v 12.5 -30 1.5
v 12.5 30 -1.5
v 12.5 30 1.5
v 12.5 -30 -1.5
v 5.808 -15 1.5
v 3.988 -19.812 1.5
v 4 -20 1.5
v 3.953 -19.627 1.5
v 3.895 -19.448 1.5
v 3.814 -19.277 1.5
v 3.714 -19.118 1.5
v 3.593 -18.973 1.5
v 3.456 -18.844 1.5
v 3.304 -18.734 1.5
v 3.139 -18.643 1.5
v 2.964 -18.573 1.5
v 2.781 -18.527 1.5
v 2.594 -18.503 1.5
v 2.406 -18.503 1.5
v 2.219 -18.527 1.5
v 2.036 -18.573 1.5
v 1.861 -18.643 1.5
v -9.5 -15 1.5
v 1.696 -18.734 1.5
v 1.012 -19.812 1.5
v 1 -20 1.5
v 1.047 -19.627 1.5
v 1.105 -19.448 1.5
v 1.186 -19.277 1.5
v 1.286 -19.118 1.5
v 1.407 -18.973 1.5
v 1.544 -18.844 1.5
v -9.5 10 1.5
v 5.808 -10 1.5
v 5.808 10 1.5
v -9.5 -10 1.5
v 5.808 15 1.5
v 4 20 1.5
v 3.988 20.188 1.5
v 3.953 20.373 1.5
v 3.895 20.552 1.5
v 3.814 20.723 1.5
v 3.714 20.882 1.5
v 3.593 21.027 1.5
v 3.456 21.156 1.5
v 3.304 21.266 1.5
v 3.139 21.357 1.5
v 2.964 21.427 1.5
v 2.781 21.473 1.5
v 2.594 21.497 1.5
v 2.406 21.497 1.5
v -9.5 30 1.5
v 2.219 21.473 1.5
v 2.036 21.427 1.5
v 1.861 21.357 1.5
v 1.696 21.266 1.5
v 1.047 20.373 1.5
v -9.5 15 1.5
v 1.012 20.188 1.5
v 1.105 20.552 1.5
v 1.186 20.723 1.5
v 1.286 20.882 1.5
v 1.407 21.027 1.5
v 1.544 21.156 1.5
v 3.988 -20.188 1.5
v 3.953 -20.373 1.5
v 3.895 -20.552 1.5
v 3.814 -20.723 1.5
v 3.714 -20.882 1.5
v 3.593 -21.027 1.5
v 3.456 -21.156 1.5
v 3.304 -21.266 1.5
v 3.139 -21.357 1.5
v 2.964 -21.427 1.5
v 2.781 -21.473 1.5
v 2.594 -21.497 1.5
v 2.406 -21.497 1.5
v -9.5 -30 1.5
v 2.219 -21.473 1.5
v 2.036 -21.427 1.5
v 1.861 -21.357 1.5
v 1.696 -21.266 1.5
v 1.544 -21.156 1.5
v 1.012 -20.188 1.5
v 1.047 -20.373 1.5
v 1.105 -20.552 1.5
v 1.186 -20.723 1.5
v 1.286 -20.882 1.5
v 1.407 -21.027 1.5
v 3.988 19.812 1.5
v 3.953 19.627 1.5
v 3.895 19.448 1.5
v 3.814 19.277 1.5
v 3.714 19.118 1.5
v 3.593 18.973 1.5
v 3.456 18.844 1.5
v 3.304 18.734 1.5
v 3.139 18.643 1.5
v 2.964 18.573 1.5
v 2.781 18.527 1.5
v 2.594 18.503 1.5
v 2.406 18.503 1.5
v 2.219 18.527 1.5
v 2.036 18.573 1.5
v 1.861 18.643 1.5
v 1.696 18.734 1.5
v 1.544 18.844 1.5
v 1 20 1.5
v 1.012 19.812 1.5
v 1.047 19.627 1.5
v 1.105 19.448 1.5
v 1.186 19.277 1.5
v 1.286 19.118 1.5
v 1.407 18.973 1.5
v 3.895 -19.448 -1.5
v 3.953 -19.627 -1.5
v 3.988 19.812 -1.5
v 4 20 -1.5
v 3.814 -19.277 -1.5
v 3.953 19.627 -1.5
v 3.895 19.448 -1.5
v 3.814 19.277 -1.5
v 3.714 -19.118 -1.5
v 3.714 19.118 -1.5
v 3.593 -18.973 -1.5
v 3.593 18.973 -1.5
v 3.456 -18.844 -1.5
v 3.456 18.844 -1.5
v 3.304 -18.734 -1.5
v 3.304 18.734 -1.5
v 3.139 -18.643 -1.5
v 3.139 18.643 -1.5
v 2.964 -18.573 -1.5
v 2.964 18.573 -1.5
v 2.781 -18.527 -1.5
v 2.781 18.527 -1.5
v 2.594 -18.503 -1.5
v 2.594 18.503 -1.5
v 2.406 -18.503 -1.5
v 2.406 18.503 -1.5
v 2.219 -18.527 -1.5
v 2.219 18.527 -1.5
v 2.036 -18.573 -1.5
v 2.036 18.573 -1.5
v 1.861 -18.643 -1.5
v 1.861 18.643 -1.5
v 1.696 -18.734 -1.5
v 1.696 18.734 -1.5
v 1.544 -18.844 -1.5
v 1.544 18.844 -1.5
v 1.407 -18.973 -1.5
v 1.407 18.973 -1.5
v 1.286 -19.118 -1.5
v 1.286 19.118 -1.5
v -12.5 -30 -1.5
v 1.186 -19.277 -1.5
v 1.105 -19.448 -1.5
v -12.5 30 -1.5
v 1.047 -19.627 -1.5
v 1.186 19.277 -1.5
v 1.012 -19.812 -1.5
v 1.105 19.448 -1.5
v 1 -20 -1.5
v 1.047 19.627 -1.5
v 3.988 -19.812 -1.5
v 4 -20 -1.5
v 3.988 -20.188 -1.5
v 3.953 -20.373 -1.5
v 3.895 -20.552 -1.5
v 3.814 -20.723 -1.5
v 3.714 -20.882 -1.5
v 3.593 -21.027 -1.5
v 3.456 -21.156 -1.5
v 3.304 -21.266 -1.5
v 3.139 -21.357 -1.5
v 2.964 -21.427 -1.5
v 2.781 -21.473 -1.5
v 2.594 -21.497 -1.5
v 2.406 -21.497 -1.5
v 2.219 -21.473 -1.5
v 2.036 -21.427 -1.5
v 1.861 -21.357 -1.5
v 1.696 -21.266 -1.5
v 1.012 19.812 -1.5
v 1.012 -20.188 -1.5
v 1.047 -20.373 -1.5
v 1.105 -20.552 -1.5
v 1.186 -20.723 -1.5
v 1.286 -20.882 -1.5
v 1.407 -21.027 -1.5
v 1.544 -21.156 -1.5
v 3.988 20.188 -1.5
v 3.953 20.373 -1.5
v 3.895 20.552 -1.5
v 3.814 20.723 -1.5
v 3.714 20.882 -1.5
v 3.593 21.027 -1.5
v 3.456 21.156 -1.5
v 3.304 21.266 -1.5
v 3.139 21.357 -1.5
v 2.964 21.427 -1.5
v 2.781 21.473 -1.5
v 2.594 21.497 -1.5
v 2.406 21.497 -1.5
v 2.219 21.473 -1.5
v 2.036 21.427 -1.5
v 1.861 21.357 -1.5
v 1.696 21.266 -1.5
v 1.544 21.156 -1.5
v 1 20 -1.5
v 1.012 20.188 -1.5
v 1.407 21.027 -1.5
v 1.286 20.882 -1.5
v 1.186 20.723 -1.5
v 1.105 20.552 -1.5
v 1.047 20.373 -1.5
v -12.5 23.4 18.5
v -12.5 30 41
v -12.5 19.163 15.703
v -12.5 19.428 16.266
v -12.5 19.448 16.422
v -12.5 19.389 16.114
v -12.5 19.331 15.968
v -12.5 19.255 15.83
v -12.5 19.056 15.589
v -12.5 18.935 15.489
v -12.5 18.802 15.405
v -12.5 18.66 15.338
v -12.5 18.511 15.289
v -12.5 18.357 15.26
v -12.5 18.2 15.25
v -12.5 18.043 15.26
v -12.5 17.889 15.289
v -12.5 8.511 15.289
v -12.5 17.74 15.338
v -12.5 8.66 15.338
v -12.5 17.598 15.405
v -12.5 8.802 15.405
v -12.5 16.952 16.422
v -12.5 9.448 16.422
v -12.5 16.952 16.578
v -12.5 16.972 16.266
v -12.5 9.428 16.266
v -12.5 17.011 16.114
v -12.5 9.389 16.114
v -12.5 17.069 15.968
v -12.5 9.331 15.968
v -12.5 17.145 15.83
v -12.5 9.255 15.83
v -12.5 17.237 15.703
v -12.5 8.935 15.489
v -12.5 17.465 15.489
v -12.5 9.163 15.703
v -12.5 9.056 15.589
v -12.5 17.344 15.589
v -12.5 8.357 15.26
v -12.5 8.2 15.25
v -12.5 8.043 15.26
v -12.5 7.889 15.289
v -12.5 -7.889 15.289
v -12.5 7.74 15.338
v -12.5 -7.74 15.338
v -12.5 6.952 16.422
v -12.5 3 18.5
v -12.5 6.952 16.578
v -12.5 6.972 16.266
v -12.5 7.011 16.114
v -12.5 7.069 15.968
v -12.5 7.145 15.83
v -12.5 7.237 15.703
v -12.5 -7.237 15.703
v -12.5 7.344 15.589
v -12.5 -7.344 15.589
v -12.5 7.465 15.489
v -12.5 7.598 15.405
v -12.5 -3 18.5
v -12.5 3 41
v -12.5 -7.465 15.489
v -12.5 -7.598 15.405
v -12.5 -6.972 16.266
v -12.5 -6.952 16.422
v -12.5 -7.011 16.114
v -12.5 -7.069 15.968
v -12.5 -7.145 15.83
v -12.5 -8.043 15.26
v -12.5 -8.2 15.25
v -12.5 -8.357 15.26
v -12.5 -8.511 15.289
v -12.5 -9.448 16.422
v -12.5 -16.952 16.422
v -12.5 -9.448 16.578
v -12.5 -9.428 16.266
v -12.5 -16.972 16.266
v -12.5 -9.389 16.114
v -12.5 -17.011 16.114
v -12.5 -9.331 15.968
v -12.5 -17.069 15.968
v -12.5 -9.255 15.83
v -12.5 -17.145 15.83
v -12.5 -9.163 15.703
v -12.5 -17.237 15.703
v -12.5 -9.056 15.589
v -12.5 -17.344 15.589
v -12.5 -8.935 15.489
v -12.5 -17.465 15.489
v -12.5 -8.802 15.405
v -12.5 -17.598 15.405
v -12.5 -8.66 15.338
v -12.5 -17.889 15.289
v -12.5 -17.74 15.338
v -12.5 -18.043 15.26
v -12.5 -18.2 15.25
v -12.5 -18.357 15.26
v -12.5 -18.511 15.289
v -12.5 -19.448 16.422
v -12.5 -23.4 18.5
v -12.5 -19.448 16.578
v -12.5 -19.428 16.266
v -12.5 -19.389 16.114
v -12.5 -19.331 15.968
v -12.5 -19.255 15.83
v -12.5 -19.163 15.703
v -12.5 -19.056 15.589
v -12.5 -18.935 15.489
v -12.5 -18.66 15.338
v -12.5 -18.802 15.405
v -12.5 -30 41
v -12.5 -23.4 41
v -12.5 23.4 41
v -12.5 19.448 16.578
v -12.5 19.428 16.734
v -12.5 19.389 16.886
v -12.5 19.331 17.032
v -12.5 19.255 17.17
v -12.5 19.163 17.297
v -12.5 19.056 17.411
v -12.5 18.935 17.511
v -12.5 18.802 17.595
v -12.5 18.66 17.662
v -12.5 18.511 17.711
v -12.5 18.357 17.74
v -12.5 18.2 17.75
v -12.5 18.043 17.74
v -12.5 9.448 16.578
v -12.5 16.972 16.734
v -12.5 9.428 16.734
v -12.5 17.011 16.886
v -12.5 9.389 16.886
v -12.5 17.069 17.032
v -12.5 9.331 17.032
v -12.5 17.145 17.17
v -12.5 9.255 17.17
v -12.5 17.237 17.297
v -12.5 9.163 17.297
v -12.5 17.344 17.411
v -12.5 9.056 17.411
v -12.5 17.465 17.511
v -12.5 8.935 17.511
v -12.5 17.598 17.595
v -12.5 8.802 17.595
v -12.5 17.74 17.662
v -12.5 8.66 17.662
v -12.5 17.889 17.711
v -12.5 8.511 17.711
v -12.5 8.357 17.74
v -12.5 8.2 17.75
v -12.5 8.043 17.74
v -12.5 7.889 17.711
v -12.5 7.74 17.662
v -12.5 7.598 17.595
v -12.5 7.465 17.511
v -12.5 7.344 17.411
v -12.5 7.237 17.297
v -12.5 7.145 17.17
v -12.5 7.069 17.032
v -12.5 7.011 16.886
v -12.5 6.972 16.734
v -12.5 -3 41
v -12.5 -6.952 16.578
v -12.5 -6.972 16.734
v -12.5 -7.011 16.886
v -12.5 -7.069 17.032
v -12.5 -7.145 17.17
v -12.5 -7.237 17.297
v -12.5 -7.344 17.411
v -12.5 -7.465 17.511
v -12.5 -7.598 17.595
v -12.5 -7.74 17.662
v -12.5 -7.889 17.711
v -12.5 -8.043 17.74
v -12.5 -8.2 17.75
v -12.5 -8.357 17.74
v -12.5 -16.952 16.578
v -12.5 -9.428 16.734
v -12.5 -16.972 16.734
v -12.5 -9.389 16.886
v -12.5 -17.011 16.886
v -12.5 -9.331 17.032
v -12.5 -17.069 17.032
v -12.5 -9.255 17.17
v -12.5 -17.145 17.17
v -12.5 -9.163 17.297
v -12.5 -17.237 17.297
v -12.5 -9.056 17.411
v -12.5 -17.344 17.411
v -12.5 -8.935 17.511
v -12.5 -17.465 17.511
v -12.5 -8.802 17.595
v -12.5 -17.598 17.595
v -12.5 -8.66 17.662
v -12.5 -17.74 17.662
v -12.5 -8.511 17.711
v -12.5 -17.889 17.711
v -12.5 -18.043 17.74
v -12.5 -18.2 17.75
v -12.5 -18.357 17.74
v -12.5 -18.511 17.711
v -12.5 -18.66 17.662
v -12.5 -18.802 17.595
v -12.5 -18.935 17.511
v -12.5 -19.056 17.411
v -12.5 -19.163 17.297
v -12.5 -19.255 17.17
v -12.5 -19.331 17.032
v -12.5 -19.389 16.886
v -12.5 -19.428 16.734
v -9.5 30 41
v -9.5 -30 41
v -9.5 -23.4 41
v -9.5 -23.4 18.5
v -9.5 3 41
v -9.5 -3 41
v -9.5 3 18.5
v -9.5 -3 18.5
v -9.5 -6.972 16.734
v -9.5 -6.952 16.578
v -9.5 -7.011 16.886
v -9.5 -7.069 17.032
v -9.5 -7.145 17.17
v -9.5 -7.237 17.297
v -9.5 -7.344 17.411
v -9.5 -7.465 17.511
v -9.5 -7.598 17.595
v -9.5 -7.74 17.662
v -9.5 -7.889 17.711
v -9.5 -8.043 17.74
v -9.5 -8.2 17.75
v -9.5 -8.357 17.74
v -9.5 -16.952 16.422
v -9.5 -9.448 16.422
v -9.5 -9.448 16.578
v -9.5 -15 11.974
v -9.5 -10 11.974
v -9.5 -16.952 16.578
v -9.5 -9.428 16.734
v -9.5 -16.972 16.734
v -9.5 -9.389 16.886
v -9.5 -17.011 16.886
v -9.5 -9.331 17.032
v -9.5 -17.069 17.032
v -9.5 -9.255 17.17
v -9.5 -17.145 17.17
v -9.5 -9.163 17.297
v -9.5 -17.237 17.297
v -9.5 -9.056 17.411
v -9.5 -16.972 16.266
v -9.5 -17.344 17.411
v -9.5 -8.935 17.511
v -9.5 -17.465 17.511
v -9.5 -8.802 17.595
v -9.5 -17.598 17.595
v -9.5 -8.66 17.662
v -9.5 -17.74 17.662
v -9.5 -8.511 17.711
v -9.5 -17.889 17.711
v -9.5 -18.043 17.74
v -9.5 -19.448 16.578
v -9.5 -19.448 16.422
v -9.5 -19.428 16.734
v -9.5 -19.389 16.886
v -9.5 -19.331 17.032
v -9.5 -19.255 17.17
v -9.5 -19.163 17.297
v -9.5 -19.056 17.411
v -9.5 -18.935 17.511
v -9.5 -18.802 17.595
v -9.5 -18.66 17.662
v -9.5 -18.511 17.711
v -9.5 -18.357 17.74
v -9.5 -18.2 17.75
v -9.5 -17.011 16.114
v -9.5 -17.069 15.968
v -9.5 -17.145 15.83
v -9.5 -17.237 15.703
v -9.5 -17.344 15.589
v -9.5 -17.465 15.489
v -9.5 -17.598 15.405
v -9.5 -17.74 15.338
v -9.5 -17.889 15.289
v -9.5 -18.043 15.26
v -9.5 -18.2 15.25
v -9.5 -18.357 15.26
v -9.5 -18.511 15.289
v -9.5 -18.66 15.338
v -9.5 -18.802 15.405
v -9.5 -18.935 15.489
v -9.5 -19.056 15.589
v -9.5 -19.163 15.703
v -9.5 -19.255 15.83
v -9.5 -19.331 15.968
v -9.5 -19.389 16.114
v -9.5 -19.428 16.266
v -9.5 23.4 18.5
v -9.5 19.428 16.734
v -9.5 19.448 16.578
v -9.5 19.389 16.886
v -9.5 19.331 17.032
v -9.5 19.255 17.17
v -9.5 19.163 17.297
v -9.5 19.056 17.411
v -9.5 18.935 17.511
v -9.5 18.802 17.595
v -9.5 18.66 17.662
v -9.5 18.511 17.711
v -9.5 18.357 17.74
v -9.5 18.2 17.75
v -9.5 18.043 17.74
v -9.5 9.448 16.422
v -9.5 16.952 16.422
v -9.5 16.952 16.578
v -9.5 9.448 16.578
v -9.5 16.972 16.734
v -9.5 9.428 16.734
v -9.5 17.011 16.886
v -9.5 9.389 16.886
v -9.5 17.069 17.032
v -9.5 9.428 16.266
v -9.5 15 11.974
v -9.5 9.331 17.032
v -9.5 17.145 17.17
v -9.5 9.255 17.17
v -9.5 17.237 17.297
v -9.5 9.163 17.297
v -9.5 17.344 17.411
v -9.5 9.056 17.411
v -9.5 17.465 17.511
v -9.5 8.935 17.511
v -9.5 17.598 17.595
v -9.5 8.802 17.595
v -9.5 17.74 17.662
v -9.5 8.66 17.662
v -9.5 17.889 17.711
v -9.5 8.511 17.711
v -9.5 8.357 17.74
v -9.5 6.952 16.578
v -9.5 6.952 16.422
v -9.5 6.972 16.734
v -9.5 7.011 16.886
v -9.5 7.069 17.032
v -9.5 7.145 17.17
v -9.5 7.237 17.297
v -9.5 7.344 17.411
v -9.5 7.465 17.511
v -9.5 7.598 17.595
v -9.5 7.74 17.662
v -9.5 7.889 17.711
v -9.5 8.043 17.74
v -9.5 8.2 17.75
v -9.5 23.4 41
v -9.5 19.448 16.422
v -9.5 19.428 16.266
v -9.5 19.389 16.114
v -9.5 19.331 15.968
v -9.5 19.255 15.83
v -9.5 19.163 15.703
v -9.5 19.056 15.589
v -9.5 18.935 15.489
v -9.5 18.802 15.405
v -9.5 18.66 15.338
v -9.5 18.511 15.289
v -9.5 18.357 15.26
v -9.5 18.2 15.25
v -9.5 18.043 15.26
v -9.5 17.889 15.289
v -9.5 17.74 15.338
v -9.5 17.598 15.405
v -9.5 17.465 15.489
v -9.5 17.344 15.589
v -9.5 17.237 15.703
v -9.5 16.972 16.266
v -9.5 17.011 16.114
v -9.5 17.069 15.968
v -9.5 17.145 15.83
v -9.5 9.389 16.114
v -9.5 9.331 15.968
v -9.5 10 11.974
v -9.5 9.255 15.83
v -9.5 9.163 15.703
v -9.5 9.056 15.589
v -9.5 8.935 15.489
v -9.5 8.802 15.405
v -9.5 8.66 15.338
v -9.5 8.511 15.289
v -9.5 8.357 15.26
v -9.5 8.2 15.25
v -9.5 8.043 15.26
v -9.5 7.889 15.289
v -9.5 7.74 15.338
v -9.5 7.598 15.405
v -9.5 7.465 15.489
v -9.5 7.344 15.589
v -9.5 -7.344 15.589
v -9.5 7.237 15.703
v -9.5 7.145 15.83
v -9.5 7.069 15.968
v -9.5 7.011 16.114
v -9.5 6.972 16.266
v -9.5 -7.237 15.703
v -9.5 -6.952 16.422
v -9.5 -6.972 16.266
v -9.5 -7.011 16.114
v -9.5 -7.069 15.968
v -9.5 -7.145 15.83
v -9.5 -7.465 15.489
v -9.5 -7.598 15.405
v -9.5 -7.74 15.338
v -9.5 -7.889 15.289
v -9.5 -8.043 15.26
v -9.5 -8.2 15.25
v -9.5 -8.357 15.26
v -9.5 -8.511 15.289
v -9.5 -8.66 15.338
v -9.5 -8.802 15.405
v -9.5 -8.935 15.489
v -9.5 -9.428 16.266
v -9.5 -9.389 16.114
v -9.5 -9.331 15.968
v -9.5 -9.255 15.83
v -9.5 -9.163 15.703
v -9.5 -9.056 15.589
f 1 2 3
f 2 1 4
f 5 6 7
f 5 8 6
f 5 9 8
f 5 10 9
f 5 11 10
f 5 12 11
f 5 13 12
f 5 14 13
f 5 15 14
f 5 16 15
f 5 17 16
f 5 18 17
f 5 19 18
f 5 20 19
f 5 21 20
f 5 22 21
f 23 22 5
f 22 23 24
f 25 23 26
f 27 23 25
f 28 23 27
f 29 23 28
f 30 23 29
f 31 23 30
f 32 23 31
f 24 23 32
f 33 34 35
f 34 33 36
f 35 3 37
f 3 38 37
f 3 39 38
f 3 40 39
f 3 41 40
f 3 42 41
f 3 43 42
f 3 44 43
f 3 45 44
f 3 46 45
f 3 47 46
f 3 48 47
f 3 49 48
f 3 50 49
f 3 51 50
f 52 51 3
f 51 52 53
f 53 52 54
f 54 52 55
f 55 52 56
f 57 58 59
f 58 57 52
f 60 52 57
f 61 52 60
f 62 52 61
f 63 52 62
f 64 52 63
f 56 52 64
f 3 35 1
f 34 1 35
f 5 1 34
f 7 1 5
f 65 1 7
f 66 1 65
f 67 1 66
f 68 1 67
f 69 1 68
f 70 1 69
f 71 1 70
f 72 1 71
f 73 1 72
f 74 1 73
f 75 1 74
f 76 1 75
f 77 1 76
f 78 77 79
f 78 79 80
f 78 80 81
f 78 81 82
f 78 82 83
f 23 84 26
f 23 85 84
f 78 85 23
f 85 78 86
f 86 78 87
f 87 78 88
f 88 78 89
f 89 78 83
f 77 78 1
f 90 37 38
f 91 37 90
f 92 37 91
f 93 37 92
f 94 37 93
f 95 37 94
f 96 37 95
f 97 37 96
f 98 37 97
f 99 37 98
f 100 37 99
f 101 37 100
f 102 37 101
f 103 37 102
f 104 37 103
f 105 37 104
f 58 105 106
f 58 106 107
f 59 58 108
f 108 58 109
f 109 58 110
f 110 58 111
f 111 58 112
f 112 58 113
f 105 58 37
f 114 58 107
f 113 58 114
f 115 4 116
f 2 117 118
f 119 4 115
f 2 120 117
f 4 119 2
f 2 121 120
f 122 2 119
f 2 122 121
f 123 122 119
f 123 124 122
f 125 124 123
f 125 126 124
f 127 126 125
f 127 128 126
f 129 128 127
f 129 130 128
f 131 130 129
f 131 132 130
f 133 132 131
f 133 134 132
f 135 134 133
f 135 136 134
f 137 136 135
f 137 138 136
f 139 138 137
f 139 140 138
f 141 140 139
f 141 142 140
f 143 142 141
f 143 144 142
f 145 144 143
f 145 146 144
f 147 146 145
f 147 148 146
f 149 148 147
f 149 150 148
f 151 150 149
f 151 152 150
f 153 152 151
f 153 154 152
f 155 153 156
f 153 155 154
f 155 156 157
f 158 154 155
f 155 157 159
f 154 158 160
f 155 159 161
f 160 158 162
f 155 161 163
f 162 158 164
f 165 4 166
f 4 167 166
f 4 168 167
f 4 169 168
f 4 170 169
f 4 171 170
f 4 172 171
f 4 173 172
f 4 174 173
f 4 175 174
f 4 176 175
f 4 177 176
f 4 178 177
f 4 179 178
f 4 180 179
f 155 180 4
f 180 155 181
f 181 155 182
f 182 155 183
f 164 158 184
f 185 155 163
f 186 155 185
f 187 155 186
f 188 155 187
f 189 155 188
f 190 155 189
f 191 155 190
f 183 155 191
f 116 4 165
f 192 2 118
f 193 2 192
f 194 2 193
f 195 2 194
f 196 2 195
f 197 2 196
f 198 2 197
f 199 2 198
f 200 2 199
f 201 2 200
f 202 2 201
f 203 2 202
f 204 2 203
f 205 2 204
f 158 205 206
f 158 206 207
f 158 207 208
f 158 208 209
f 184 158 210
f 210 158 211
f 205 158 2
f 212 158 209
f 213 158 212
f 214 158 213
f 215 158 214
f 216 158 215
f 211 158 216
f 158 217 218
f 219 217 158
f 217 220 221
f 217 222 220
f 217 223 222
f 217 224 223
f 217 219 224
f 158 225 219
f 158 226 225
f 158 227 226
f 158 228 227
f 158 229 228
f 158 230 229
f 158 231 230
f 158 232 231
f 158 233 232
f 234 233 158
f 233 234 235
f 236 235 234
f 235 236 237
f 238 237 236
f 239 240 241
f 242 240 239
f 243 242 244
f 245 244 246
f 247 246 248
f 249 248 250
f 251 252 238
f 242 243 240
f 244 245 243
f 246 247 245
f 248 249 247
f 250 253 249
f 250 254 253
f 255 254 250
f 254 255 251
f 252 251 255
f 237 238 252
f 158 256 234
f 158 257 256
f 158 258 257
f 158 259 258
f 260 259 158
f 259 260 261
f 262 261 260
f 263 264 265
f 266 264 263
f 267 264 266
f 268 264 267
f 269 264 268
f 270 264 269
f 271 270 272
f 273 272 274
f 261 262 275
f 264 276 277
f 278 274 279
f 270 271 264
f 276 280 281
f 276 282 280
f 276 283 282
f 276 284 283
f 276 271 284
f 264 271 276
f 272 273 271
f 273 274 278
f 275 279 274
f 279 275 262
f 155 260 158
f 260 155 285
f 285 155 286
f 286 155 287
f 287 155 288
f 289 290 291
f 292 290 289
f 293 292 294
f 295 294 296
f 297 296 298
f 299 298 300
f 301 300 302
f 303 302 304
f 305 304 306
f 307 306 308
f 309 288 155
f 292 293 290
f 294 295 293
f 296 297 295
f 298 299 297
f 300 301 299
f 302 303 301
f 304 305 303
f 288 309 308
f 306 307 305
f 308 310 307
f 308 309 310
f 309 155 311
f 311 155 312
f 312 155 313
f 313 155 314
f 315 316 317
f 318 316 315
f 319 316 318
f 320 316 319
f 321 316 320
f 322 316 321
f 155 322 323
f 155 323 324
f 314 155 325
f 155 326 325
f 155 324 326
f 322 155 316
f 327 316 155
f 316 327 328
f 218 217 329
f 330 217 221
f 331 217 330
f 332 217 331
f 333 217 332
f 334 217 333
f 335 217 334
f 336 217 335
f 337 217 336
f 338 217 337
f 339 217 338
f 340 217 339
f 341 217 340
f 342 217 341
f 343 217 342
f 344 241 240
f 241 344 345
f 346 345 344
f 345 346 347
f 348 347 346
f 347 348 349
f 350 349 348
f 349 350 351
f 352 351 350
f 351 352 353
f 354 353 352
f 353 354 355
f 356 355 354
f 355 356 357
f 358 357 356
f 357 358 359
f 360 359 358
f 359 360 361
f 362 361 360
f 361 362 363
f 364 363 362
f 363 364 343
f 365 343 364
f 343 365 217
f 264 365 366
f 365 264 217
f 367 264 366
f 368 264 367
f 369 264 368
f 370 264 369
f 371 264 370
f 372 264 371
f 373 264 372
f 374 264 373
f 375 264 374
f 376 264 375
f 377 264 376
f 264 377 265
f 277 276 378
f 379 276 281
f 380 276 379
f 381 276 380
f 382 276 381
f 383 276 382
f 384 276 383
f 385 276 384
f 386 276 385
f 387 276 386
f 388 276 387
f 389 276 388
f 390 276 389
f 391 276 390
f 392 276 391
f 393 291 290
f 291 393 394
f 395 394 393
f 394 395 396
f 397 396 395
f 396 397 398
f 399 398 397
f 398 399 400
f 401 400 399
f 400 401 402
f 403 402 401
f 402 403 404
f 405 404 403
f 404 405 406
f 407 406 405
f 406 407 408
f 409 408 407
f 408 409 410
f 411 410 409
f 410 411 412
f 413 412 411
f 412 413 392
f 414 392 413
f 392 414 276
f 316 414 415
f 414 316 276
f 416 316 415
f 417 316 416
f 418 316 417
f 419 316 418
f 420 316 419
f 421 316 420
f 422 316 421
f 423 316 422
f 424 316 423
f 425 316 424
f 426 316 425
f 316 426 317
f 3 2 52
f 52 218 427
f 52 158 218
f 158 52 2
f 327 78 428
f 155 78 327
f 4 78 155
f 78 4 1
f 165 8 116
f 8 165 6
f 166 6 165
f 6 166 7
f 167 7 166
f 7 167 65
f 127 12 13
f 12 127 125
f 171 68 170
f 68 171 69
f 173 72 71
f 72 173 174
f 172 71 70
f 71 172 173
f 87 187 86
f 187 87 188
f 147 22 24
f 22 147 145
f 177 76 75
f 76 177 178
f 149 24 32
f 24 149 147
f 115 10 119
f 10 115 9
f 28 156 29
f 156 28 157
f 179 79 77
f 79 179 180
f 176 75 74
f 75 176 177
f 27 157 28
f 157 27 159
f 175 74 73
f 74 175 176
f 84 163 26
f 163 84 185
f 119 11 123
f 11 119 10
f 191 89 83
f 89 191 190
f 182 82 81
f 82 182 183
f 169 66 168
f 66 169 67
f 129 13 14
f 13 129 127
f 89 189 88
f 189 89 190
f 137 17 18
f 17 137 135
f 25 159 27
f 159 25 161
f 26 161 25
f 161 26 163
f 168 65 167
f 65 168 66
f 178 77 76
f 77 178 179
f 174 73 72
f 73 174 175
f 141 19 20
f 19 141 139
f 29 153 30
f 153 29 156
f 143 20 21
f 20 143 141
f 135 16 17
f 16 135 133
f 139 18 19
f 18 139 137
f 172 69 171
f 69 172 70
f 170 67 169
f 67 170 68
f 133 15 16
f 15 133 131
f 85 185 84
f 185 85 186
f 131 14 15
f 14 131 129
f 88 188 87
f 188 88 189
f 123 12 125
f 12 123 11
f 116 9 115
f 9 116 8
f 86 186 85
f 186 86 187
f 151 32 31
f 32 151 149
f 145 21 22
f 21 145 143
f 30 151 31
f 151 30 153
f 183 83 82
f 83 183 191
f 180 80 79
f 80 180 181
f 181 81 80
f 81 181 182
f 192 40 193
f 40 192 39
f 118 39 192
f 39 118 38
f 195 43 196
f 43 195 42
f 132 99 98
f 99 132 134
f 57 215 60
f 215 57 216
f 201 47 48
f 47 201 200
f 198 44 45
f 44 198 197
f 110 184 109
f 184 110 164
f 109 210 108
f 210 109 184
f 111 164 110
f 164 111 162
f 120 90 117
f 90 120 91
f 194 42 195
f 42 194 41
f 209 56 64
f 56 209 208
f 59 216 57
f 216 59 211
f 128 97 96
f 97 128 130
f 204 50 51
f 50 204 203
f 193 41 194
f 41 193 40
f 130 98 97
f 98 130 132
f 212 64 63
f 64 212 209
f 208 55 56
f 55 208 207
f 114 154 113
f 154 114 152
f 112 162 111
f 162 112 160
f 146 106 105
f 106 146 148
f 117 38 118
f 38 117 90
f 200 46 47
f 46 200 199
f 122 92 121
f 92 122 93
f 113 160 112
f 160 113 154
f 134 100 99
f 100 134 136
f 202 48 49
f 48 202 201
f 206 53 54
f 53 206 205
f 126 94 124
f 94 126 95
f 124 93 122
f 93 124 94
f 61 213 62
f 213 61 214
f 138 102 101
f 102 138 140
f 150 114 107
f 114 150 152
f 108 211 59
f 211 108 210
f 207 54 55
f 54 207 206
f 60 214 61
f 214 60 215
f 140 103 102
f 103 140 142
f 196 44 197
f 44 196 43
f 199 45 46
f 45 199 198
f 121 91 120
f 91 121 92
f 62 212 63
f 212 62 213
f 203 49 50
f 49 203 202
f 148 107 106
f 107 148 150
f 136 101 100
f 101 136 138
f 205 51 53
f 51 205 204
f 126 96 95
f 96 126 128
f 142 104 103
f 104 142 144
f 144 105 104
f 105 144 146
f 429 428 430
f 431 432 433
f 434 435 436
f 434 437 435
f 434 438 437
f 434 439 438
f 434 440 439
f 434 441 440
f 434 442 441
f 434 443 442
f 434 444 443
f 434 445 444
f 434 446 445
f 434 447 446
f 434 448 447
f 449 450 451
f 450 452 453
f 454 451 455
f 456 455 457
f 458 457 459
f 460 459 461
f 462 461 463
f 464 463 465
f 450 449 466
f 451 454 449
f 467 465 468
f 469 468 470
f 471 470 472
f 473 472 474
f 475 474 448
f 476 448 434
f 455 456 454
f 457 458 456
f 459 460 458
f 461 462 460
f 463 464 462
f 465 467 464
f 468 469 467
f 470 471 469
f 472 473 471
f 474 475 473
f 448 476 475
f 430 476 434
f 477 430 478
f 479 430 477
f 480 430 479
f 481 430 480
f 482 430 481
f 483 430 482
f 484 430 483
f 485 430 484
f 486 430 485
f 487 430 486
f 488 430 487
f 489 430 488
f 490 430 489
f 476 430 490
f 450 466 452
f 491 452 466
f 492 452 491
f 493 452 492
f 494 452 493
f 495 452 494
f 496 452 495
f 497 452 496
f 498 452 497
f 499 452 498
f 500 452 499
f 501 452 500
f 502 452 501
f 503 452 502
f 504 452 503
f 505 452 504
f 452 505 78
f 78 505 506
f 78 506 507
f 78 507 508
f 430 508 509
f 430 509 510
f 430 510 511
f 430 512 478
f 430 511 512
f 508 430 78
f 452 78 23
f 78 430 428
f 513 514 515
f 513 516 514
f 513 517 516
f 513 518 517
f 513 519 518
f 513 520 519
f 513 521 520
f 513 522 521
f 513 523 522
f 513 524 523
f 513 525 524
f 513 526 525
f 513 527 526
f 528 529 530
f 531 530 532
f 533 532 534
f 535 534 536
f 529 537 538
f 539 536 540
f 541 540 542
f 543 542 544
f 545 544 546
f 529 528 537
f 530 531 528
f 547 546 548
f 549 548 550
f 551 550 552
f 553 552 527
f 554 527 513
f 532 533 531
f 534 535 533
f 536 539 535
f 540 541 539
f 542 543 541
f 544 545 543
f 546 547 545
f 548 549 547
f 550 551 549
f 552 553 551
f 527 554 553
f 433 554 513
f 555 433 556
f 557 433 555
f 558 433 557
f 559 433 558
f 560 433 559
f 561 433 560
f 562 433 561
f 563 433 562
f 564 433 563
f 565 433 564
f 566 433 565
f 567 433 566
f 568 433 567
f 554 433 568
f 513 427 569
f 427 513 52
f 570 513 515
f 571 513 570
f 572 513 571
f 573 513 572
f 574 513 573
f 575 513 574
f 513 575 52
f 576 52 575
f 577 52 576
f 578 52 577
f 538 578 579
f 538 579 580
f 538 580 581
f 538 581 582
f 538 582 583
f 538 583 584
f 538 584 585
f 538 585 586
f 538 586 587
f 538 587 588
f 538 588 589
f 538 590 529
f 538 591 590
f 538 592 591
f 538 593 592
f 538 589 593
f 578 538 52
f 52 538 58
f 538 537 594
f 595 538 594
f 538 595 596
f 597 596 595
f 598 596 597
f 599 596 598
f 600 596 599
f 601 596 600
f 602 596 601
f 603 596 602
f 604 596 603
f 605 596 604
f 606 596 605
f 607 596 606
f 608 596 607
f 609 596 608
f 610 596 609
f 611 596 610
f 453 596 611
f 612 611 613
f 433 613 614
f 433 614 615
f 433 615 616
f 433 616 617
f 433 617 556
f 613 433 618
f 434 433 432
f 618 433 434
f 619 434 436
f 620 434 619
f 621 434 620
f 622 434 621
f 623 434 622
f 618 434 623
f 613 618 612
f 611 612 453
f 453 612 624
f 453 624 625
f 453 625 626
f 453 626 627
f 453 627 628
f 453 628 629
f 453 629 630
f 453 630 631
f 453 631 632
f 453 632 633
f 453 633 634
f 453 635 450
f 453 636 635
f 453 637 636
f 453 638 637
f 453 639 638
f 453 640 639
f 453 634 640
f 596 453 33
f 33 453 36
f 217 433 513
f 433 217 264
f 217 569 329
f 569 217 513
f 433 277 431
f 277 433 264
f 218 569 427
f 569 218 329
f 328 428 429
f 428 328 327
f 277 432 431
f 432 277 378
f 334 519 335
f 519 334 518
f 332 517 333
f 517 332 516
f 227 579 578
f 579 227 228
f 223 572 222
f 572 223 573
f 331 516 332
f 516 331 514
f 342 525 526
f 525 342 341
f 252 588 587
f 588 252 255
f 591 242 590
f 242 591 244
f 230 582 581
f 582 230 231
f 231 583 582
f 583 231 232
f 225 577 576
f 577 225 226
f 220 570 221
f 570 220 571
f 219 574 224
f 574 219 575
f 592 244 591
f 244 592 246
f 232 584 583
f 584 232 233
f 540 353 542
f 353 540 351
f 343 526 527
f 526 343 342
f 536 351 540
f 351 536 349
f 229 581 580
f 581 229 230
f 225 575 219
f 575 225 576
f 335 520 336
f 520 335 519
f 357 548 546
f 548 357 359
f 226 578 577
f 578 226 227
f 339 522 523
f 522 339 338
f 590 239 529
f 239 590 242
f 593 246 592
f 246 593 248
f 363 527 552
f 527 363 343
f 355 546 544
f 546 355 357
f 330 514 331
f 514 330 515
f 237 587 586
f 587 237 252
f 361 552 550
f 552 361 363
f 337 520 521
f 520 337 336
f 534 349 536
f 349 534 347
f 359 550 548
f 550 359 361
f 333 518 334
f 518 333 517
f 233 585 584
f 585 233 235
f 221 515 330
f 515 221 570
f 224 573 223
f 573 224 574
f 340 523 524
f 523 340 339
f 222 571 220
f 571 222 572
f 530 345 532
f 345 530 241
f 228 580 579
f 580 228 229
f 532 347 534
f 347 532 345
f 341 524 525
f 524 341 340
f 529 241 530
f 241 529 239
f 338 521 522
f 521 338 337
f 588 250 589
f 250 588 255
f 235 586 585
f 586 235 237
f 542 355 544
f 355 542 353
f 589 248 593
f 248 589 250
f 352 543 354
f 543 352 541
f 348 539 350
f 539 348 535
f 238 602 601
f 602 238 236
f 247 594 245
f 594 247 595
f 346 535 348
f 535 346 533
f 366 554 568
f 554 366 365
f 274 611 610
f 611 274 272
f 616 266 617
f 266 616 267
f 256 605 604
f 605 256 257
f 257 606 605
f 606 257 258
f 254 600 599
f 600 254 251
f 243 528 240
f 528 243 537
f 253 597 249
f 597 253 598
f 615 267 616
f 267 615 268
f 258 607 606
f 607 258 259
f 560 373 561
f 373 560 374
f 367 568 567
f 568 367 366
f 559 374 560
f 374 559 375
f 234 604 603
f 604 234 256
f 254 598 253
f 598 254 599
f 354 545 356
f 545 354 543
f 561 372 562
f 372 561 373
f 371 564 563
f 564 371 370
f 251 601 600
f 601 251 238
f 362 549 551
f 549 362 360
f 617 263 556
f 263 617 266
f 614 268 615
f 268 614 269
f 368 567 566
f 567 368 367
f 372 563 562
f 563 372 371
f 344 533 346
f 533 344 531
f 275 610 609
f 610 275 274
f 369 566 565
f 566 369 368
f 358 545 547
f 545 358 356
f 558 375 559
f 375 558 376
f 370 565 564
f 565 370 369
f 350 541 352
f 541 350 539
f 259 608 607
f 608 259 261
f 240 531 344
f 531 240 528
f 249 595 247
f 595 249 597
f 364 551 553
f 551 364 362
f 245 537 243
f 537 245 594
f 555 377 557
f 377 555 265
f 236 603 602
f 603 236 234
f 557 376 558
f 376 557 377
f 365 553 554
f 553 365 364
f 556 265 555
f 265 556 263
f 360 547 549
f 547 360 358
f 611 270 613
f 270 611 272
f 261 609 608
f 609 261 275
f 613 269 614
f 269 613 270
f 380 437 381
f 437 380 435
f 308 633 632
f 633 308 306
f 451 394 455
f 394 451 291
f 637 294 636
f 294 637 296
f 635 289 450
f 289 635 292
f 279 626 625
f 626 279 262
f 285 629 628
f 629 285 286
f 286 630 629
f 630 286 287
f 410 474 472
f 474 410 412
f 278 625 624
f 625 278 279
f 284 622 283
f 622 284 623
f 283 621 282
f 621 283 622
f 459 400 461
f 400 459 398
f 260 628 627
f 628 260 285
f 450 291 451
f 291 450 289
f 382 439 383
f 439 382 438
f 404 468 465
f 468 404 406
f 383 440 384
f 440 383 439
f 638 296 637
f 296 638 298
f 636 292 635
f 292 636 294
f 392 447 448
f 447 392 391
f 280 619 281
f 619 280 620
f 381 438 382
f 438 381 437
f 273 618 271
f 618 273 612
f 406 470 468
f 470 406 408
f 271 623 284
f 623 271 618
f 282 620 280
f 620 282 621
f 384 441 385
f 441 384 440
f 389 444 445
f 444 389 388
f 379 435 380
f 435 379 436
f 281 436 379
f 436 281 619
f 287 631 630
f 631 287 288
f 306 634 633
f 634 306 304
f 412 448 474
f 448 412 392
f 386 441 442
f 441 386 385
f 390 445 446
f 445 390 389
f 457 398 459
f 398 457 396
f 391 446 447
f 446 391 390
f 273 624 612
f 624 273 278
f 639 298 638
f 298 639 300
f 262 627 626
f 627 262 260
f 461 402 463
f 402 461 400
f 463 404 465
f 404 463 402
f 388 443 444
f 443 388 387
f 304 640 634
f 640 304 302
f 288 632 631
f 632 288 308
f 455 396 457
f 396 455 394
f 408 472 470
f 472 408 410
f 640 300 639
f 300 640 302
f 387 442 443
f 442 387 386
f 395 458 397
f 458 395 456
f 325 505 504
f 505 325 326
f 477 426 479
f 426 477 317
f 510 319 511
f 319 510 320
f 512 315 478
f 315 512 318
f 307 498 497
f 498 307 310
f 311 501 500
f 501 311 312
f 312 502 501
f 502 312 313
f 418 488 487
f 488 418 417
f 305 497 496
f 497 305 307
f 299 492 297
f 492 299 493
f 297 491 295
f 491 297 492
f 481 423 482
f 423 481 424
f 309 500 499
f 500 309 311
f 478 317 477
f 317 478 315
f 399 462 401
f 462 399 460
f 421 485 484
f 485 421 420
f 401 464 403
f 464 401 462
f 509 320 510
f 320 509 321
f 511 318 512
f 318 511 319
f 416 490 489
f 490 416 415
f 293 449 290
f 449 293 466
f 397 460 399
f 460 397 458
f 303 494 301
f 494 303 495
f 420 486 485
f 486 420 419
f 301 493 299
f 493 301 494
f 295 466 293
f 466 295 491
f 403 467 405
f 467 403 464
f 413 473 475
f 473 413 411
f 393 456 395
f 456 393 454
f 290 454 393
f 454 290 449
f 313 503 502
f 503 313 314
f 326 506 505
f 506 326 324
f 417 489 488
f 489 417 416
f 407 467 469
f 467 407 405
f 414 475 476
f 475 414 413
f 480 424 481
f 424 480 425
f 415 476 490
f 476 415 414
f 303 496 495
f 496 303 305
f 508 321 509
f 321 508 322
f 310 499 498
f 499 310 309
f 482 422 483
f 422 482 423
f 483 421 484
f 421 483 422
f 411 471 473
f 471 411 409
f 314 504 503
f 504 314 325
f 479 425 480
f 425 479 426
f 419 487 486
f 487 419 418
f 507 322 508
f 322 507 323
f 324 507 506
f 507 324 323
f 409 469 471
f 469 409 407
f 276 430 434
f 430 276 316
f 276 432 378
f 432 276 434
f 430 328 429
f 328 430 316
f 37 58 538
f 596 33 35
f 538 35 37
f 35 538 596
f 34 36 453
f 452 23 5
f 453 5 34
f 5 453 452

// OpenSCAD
//Author: Piotr Paterek, Kraków 05-08.2016
$fn=50;
module bevel()
{
    module base()
    {
        difference()
        {
           difference()
            {
                cube([25,60,3], center=true);
                translate([2.5,-20,-1.5])
                {
                    cylinder(r=1.5, h=3);
                }
            }
            translate([2.5,20,-1.5])
            {
                cylinder(r=1.5, h=3);
            }
        }
    }
    base();
    translate([-11,0,26.5])
    {
        cube([3,60,50], center=true);
    }
}

//holes for servos
difference()
{ 
    difference()
    { 
        difference()
        { 
            difference()
            { 
            
                difference()
                { 
                    difference()
                    {
                    difference()
                    {
                        bevel();
                        translate([-7.5,13.2,30])
                        {
                            cube([10,20.4,23],center=true);
                            }
                                }
                                
                                rotate(a=90, v=[0,1,0])
                                {
                                translate([-53.5,0,-7.5])
                                {
                                    cube([25,60,15], center=true);
                                }
                                    }
                                    }
                                        rotate(a=90, v=[0,1,0])
                                        {
                                            translate([-16.5,18.2,-7.5])
                                            {
                                                cylinder(r=1.25, h=10, center=true);
                                                }
                                            }
                                            rotate(a=90, v=[0,1,0])
                                            {
                                                translate([-16.5,8.2,-7.5])
                                                {
                                                     cylinder(r=1.25, h=10, center=true);
                                                    }
                                                }
                                            rotate(a=90, v=[0,1,0])
                                            {
                                                translate([-16.5,-8.2,-7.5])
                                                {
                                                    cylinder(r=1.25, h=10, center=true);
                                                }
                                               }
                                            }
                                            rotate(a=90, v=[0,1,0])
                                            {
                                                translate([-16.5,-18.2,-7.5])
                                                {
                                                    cylinder(r=1.25, h=10, center=true);
                                                    }
                                                }
                                            }
                                        translate([-7.5,-13.2,30])
                                        {
                                            cube([10,20.4,23],center=true);
                                        }
                                    }
                                }
                            }
                        translate([2,15,-2])
                        {
                    
                            rotate(a=90,v=[1,0,0])
                            {
                                linear_extrude(height=5, convexity = 10){
                                polygon(points=[[-13,15],[6,2],[-13,2]]);
                            }
                        }
                    }
                    translate([2,-10,-2])
                    {
        
                    rotate(a=90,v=[1,0,0])
                        {
        linear_extrude(height=5, convexity = 10){
        polygon(points=[[-13,15],[6,2],[-13,2]]);
        }
    }
} 
